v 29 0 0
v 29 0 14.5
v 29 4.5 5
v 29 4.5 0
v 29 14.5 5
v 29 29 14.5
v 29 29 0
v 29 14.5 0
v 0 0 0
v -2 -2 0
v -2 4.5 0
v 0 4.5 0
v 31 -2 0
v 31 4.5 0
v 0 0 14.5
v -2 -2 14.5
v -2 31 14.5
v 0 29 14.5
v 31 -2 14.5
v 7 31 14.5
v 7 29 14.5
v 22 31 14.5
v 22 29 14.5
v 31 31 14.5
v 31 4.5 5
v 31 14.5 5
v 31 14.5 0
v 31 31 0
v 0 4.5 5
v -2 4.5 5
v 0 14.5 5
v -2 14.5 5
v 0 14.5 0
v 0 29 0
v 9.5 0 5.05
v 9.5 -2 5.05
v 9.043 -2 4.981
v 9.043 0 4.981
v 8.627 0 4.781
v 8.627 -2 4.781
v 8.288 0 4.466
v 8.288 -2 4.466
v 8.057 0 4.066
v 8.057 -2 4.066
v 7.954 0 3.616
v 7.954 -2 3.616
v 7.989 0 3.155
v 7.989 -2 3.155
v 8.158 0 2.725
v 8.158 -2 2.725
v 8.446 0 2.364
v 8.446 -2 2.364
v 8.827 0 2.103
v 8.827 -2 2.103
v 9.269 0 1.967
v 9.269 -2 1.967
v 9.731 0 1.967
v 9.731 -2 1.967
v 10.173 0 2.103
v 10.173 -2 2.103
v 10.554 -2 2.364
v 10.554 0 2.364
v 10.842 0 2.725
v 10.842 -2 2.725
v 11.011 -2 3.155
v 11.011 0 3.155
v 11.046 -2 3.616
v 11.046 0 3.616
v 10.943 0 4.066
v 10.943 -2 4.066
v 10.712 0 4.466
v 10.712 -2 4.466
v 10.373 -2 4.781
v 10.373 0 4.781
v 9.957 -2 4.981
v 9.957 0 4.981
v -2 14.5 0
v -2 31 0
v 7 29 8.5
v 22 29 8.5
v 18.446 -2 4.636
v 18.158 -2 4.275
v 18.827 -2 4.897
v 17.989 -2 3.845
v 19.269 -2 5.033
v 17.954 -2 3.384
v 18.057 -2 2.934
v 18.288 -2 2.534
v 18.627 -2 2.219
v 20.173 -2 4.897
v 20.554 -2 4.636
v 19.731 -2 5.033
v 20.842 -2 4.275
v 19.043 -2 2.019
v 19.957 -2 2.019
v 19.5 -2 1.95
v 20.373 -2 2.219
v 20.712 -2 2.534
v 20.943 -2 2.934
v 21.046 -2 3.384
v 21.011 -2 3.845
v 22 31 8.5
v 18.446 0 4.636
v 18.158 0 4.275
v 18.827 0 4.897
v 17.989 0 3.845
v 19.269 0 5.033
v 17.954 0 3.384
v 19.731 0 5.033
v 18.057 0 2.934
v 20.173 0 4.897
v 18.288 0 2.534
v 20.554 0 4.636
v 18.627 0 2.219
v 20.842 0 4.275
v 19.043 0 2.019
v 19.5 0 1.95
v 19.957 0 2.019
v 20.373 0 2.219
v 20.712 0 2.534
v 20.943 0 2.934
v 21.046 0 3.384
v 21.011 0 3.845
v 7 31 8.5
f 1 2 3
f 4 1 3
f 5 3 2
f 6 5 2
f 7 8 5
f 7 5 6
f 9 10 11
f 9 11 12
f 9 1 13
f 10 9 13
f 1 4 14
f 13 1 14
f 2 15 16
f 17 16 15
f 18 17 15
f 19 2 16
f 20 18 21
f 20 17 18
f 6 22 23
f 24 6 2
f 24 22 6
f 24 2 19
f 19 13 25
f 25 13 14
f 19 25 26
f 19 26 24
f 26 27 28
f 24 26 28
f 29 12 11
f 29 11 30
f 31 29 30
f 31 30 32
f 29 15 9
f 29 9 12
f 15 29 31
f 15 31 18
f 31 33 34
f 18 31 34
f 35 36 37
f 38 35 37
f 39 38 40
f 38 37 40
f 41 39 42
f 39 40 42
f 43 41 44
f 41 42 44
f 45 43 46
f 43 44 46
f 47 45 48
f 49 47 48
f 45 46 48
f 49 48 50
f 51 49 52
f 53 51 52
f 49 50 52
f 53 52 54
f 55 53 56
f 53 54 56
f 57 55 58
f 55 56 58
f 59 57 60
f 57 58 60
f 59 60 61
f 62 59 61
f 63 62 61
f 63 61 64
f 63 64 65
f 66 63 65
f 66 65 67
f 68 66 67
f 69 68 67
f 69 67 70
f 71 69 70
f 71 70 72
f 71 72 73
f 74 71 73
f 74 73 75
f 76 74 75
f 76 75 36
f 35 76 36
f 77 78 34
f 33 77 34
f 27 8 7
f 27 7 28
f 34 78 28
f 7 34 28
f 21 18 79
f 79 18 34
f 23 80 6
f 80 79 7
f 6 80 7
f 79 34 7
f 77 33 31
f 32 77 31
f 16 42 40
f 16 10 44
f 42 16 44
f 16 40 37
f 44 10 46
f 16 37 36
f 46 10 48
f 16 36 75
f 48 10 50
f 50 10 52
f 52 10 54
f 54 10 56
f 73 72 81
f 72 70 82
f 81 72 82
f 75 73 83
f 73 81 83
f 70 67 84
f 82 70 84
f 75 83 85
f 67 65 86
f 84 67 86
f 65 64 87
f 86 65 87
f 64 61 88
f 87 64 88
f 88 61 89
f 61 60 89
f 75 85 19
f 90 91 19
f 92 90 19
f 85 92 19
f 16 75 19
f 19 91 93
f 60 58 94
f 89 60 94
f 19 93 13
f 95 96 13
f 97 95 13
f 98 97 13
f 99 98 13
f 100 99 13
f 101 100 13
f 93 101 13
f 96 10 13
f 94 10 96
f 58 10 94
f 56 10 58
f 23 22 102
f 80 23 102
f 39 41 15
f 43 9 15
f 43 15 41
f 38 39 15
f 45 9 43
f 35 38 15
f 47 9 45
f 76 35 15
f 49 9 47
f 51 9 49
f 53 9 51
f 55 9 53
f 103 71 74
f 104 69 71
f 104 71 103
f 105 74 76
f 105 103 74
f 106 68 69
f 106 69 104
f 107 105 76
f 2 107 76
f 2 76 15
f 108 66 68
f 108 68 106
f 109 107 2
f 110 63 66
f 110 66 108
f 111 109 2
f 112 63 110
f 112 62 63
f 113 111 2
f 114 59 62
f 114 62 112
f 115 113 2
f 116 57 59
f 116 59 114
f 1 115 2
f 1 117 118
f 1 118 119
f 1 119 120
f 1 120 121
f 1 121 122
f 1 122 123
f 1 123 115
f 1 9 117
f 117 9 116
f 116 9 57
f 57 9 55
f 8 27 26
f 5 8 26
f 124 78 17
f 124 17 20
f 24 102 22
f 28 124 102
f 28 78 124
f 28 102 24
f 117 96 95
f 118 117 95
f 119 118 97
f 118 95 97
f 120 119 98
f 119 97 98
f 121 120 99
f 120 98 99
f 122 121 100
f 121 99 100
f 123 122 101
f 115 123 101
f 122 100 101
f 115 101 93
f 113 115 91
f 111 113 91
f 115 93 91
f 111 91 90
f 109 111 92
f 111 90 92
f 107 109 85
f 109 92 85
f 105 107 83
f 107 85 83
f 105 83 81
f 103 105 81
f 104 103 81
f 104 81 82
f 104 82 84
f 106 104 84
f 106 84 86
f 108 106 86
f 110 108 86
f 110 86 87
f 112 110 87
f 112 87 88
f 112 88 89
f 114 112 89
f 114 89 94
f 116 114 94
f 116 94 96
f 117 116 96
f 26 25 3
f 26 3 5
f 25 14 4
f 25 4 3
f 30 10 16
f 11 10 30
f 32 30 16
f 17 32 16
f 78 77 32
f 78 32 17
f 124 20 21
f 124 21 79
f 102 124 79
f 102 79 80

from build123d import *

# Parameters (mm, degrees)
SKETCH_1_W               = 33
SKETCH_1_H               = 33
SKETCH_1_W_2             = 29
SKETCH_1_H_2             = 29
EXTRUDE_1_DEPTH          = 14.5
CUT_EXTRUDE_2_REACH      = 49.542
SKETCH_3_W               = 15
SKETCH_3_H               = 6
CUT_EXTRUDE_4_REACH      = 49.542
SKETCH_5_R               = 1.55
CUT_EXTRUDE_5_DEPTH      = 48.542086618
CUT_EXTRUDE_5_DEPTH_BACK = 48.542086618
SKETCH_6_W               = 5
SKETCH_6_H               = 10


with BuildPart() as part:
    # 草图1 → 凸台-拉伸1 (new body)
    with BuildSketch(Plane.XY):
        with Locations((14.5, 14.5)):
            Rectangle(SKETCH_1_W, SKETCH_1_H)
        with Locations((14.5, 14.5)):
            Rectangle(SKETCH_1_W_2, SKETCH_1_H_2, mode=Mode.SUBTRACT)
    extrude(amount=EXTRUDE_1_DEPTH)

    # 草图3 → 切除-拉伸2 (cut, up to next)
    with BuildSketch(Plane(origin=(0, 31, 0), x_dir=(1, 0, 0), z_dir=(0, 1, 0)), mode=Mode.PRIVATE) as cut_extrude_2_sk1:
        with Locations((14.5, -11.5)):
            Rectangle(SKETCH_3_W, SKETCH_3_H)
    cut_extrude_2_tool1 = extrude(cut_extrude_2_sk1.sketch, amount=-CUT_EXTRUDE_2_REACH, mode=Mode.PRIVATE) & part.part
    add(cut_extrude_2_tool1.solids().sort_by_distance((14.5, 31, 11.5))[0], mode=Mode.SUBTRACT)

    # 草图5 → 切除-拉伸4 (cut, up to next)
    with BuildSketch(Plane.XZ.offset(2), mode=Mode.PRIVATE) as cut_extrude_4_sk1:
        with Locations(Location((19.5, 3.5, 0), (0, 0, 270))):
            Circle(SKETCH_5_R)
    cut_extrude_4_tool1 = extrude(cut_extrude_4_sk1.sketch, amount=-CUT_EXTRUDE_4_REACH, mode=Mode.PRIVATE) & part.part
    # 草图5 → 切除-拉伸4 (cut, up to next)
    with BuildSketch(Plane.XZ.offset(2), mode=Mode.PRIVATE) as cut_extrude_4_sk2:
        with Locations(Location((9.5, 3.5, 0), (0, 0, 90))):
            Circle(SKETCH_5_R)
    cut_extrude_4_tool2 = extrude(cut_extrude_4_sk2.sketch, amount=-CUT_EXTRUDE_4_REACH, mode=Mode.PRIVATE) & part.part
    add(cut_extrude_4_tool1.solids().sort_by_distance((19.5, -2, 3.5))[0], mode=Mode.SUBTRACT)
    add(cut_extrude_4_tool2.solids().sort_by_distance((9.5, -2, 3.5))[0], mode=Mode.SUBTRACT)

    # 草图6 → 切除-拉伸5 (cut, two sides: drawn at the far end of the back side and taken through both)
    with BuildSketch(Plane.ZY.offset(2).offset(-CUT_EXTRUDE_5_DEPTH_BACK)):
        with Locations((2.5, 9.5)):
            Rectangle(SKETCH_6_W, SKETCH_6_H)
    extrude(amount=CUT_EXTRUDE_5_DEPTH + CUT_EXTRUDE_5_DEPTH_BACK, mode=Mode.SUBTRACT)


solid = part.part
